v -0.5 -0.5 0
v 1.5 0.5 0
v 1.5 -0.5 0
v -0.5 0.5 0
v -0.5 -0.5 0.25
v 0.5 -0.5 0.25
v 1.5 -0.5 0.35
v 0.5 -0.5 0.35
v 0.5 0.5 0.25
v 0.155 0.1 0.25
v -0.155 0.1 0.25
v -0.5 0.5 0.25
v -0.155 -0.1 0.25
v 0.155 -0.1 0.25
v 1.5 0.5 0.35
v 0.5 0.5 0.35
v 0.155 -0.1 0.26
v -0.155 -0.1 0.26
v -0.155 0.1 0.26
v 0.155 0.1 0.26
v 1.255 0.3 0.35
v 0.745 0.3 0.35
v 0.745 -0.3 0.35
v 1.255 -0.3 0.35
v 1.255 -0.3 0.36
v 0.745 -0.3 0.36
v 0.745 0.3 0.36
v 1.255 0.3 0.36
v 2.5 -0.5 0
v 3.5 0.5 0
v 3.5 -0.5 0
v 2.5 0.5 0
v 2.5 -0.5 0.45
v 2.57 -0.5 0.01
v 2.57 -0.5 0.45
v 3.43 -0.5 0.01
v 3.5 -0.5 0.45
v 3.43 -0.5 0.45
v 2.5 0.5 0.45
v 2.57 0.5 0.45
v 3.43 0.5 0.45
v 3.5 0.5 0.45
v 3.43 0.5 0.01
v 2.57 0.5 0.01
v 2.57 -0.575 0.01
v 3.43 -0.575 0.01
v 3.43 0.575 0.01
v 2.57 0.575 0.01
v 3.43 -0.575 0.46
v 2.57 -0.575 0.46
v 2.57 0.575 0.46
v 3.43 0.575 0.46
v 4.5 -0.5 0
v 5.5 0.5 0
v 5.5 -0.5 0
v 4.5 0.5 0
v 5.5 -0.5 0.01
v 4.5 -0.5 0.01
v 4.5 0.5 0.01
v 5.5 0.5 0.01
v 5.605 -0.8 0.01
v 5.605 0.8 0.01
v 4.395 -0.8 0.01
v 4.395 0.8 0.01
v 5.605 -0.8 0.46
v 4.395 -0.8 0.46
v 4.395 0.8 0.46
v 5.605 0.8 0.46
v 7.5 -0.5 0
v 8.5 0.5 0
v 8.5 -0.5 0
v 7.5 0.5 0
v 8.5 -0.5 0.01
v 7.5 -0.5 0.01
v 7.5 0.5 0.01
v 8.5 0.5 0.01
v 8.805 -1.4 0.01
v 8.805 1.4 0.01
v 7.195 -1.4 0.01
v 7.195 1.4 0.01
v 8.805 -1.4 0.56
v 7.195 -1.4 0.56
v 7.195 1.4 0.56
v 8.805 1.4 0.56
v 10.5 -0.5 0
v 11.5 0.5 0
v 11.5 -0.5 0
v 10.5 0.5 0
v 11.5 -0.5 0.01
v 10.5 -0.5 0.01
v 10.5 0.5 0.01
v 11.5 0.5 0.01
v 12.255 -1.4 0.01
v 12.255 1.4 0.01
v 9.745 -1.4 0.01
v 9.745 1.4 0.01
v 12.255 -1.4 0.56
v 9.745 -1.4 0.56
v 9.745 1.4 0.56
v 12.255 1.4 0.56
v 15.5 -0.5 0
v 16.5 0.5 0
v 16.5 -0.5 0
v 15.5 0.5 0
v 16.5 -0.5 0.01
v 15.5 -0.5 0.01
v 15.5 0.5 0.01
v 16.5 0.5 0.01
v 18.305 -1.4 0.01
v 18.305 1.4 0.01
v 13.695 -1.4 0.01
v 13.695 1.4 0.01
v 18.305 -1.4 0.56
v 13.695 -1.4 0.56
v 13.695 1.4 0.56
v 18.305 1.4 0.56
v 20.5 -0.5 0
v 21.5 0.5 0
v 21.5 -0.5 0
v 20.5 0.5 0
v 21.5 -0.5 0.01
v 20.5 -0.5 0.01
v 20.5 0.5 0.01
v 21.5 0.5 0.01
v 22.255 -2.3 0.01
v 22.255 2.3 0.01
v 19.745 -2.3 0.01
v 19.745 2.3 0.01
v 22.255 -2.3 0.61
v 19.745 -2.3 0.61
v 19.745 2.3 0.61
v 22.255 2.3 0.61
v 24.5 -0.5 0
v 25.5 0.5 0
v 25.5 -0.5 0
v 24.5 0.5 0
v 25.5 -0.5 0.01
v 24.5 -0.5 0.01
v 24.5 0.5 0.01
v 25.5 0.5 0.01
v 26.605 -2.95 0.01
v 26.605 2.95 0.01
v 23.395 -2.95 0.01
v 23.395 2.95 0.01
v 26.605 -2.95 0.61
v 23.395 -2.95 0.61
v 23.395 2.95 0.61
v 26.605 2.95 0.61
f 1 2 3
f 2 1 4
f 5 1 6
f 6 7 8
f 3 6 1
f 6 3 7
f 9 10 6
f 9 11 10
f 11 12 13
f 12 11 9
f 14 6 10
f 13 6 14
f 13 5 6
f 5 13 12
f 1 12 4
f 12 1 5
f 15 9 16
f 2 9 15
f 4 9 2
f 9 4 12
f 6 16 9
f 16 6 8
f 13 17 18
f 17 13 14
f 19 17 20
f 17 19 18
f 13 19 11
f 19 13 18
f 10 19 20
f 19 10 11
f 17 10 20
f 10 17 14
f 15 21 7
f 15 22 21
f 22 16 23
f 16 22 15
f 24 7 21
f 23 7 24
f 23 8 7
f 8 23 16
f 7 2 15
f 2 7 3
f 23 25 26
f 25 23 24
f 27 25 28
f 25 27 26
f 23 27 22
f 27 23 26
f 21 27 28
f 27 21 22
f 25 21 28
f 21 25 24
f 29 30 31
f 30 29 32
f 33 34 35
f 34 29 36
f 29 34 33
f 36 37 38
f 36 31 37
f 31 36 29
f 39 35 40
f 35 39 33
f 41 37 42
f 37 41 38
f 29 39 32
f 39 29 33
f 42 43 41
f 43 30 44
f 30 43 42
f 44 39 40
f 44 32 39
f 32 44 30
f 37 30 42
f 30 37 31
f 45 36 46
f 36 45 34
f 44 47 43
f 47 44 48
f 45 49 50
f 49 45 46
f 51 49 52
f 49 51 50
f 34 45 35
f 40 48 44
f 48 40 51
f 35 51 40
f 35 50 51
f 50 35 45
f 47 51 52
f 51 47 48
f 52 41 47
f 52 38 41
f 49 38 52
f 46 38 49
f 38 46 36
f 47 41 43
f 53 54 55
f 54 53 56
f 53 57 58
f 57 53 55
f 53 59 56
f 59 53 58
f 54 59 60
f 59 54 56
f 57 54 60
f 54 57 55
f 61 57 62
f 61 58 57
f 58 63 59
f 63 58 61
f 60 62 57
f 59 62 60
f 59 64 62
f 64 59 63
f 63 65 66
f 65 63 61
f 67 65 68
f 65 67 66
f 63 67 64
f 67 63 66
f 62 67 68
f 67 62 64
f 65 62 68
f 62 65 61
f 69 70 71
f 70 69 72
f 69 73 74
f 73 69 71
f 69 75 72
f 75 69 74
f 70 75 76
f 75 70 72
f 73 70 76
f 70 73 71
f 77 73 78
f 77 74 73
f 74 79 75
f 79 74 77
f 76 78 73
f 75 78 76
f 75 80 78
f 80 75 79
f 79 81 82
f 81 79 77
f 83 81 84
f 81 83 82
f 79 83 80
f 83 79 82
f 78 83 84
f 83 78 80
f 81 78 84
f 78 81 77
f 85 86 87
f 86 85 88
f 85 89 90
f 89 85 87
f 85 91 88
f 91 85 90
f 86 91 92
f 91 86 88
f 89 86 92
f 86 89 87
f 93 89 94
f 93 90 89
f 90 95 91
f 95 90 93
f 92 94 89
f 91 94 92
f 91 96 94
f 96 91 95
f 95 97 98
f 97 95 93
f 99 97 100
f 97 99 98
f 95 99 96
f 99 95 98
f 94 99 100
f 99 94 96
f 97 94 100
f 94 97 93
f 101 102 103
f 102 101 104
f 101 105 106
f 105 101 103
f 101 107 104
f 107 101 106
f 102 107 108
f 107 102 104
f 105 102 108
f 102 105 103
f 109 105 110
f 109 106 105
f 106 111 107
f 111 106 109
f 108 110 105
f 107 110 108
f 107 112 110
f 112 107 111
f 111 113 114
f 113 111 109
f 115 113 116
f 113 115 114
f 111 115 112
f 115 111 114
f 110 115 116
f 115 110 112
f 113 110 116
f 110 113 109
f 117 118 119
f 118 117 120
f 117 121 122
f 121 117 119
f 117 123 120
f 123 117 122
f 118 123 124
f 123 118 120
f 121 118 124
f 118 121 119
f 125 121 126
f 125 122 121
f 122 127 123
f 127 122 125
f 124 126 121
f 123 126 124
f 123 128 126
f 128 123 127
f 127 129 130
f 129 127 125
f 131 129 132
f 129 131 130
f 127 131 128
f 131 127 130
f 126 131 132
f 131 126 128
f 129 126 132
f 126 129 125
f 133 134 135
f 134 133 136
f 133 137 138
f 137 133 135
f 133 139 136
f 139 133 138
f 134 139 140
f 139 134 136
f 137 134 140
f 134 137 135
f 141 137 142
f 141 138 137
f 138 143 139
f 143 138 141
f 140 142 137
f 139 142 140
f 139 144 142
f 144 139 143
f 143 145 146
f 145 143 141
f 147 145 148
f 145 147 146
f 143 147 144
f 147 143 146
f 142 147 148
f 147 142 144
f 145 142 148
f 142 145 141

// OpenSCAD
$fa = 2; $fs = 0.2;

eps = 0.01;

module resistor(n, size) {
    color("silver")
        linear_extrude(size.z, convexity = 3)
            difference() {
                square(size.xy, center = true);
            }
    color("black")
        translate([0, 0, eps])
            linear_extrude(size.z, convexity = 3)
                square([size.x - 0.4, size.y + eps], center = true);
}

module resistor_0201() resistor("0201", [ 0.6,  0.3, 0.25]);
module resistor_0402() resistor("0402", [ 1.0,  0.5, 0.35]);
module resistor_0603() resistor("0603", [1.55, 0.85, 0.45]);
module resistor_0805() resistor("0805", [ 2.0,  1.2, 0.45]);
module resistor_1206() resistor("1206", [ 3.2,  1.6, 0.55]);
module resistor_1210() resistor("1210", [ 3.2,  2.5, 0.55]);
module resistor_1812() resistor("1812", [ 3.2,  4.6, 0.55]);
module resistor_2010() resistor("2010", [ 5.0,  2.5, 0.6 ]);
module resistor_2512() resistor("2512", [ 6.3,  3.2, 0.6 ]);

rotate(90) resistor_0201();
translate([1, 0, 0]) rotate(90) resistor_0402();
translate([3, 0, 0]) rotate(90) resistor_0603();
translate([5, 0, 0]) rotate(90) resistor_0805();
translate([8, 0, 0]) rotate(90) resistor_1206();
translate([11, 0, 0]) rotate(90) resistor_1210();
translate([16, 0, 0]) rotate(90) resistor_1812();
translate([21, 0, 0]) rotate(90) resistor_2010();
translate([25, 0, 0]) rotate(90) resistor_2512();
